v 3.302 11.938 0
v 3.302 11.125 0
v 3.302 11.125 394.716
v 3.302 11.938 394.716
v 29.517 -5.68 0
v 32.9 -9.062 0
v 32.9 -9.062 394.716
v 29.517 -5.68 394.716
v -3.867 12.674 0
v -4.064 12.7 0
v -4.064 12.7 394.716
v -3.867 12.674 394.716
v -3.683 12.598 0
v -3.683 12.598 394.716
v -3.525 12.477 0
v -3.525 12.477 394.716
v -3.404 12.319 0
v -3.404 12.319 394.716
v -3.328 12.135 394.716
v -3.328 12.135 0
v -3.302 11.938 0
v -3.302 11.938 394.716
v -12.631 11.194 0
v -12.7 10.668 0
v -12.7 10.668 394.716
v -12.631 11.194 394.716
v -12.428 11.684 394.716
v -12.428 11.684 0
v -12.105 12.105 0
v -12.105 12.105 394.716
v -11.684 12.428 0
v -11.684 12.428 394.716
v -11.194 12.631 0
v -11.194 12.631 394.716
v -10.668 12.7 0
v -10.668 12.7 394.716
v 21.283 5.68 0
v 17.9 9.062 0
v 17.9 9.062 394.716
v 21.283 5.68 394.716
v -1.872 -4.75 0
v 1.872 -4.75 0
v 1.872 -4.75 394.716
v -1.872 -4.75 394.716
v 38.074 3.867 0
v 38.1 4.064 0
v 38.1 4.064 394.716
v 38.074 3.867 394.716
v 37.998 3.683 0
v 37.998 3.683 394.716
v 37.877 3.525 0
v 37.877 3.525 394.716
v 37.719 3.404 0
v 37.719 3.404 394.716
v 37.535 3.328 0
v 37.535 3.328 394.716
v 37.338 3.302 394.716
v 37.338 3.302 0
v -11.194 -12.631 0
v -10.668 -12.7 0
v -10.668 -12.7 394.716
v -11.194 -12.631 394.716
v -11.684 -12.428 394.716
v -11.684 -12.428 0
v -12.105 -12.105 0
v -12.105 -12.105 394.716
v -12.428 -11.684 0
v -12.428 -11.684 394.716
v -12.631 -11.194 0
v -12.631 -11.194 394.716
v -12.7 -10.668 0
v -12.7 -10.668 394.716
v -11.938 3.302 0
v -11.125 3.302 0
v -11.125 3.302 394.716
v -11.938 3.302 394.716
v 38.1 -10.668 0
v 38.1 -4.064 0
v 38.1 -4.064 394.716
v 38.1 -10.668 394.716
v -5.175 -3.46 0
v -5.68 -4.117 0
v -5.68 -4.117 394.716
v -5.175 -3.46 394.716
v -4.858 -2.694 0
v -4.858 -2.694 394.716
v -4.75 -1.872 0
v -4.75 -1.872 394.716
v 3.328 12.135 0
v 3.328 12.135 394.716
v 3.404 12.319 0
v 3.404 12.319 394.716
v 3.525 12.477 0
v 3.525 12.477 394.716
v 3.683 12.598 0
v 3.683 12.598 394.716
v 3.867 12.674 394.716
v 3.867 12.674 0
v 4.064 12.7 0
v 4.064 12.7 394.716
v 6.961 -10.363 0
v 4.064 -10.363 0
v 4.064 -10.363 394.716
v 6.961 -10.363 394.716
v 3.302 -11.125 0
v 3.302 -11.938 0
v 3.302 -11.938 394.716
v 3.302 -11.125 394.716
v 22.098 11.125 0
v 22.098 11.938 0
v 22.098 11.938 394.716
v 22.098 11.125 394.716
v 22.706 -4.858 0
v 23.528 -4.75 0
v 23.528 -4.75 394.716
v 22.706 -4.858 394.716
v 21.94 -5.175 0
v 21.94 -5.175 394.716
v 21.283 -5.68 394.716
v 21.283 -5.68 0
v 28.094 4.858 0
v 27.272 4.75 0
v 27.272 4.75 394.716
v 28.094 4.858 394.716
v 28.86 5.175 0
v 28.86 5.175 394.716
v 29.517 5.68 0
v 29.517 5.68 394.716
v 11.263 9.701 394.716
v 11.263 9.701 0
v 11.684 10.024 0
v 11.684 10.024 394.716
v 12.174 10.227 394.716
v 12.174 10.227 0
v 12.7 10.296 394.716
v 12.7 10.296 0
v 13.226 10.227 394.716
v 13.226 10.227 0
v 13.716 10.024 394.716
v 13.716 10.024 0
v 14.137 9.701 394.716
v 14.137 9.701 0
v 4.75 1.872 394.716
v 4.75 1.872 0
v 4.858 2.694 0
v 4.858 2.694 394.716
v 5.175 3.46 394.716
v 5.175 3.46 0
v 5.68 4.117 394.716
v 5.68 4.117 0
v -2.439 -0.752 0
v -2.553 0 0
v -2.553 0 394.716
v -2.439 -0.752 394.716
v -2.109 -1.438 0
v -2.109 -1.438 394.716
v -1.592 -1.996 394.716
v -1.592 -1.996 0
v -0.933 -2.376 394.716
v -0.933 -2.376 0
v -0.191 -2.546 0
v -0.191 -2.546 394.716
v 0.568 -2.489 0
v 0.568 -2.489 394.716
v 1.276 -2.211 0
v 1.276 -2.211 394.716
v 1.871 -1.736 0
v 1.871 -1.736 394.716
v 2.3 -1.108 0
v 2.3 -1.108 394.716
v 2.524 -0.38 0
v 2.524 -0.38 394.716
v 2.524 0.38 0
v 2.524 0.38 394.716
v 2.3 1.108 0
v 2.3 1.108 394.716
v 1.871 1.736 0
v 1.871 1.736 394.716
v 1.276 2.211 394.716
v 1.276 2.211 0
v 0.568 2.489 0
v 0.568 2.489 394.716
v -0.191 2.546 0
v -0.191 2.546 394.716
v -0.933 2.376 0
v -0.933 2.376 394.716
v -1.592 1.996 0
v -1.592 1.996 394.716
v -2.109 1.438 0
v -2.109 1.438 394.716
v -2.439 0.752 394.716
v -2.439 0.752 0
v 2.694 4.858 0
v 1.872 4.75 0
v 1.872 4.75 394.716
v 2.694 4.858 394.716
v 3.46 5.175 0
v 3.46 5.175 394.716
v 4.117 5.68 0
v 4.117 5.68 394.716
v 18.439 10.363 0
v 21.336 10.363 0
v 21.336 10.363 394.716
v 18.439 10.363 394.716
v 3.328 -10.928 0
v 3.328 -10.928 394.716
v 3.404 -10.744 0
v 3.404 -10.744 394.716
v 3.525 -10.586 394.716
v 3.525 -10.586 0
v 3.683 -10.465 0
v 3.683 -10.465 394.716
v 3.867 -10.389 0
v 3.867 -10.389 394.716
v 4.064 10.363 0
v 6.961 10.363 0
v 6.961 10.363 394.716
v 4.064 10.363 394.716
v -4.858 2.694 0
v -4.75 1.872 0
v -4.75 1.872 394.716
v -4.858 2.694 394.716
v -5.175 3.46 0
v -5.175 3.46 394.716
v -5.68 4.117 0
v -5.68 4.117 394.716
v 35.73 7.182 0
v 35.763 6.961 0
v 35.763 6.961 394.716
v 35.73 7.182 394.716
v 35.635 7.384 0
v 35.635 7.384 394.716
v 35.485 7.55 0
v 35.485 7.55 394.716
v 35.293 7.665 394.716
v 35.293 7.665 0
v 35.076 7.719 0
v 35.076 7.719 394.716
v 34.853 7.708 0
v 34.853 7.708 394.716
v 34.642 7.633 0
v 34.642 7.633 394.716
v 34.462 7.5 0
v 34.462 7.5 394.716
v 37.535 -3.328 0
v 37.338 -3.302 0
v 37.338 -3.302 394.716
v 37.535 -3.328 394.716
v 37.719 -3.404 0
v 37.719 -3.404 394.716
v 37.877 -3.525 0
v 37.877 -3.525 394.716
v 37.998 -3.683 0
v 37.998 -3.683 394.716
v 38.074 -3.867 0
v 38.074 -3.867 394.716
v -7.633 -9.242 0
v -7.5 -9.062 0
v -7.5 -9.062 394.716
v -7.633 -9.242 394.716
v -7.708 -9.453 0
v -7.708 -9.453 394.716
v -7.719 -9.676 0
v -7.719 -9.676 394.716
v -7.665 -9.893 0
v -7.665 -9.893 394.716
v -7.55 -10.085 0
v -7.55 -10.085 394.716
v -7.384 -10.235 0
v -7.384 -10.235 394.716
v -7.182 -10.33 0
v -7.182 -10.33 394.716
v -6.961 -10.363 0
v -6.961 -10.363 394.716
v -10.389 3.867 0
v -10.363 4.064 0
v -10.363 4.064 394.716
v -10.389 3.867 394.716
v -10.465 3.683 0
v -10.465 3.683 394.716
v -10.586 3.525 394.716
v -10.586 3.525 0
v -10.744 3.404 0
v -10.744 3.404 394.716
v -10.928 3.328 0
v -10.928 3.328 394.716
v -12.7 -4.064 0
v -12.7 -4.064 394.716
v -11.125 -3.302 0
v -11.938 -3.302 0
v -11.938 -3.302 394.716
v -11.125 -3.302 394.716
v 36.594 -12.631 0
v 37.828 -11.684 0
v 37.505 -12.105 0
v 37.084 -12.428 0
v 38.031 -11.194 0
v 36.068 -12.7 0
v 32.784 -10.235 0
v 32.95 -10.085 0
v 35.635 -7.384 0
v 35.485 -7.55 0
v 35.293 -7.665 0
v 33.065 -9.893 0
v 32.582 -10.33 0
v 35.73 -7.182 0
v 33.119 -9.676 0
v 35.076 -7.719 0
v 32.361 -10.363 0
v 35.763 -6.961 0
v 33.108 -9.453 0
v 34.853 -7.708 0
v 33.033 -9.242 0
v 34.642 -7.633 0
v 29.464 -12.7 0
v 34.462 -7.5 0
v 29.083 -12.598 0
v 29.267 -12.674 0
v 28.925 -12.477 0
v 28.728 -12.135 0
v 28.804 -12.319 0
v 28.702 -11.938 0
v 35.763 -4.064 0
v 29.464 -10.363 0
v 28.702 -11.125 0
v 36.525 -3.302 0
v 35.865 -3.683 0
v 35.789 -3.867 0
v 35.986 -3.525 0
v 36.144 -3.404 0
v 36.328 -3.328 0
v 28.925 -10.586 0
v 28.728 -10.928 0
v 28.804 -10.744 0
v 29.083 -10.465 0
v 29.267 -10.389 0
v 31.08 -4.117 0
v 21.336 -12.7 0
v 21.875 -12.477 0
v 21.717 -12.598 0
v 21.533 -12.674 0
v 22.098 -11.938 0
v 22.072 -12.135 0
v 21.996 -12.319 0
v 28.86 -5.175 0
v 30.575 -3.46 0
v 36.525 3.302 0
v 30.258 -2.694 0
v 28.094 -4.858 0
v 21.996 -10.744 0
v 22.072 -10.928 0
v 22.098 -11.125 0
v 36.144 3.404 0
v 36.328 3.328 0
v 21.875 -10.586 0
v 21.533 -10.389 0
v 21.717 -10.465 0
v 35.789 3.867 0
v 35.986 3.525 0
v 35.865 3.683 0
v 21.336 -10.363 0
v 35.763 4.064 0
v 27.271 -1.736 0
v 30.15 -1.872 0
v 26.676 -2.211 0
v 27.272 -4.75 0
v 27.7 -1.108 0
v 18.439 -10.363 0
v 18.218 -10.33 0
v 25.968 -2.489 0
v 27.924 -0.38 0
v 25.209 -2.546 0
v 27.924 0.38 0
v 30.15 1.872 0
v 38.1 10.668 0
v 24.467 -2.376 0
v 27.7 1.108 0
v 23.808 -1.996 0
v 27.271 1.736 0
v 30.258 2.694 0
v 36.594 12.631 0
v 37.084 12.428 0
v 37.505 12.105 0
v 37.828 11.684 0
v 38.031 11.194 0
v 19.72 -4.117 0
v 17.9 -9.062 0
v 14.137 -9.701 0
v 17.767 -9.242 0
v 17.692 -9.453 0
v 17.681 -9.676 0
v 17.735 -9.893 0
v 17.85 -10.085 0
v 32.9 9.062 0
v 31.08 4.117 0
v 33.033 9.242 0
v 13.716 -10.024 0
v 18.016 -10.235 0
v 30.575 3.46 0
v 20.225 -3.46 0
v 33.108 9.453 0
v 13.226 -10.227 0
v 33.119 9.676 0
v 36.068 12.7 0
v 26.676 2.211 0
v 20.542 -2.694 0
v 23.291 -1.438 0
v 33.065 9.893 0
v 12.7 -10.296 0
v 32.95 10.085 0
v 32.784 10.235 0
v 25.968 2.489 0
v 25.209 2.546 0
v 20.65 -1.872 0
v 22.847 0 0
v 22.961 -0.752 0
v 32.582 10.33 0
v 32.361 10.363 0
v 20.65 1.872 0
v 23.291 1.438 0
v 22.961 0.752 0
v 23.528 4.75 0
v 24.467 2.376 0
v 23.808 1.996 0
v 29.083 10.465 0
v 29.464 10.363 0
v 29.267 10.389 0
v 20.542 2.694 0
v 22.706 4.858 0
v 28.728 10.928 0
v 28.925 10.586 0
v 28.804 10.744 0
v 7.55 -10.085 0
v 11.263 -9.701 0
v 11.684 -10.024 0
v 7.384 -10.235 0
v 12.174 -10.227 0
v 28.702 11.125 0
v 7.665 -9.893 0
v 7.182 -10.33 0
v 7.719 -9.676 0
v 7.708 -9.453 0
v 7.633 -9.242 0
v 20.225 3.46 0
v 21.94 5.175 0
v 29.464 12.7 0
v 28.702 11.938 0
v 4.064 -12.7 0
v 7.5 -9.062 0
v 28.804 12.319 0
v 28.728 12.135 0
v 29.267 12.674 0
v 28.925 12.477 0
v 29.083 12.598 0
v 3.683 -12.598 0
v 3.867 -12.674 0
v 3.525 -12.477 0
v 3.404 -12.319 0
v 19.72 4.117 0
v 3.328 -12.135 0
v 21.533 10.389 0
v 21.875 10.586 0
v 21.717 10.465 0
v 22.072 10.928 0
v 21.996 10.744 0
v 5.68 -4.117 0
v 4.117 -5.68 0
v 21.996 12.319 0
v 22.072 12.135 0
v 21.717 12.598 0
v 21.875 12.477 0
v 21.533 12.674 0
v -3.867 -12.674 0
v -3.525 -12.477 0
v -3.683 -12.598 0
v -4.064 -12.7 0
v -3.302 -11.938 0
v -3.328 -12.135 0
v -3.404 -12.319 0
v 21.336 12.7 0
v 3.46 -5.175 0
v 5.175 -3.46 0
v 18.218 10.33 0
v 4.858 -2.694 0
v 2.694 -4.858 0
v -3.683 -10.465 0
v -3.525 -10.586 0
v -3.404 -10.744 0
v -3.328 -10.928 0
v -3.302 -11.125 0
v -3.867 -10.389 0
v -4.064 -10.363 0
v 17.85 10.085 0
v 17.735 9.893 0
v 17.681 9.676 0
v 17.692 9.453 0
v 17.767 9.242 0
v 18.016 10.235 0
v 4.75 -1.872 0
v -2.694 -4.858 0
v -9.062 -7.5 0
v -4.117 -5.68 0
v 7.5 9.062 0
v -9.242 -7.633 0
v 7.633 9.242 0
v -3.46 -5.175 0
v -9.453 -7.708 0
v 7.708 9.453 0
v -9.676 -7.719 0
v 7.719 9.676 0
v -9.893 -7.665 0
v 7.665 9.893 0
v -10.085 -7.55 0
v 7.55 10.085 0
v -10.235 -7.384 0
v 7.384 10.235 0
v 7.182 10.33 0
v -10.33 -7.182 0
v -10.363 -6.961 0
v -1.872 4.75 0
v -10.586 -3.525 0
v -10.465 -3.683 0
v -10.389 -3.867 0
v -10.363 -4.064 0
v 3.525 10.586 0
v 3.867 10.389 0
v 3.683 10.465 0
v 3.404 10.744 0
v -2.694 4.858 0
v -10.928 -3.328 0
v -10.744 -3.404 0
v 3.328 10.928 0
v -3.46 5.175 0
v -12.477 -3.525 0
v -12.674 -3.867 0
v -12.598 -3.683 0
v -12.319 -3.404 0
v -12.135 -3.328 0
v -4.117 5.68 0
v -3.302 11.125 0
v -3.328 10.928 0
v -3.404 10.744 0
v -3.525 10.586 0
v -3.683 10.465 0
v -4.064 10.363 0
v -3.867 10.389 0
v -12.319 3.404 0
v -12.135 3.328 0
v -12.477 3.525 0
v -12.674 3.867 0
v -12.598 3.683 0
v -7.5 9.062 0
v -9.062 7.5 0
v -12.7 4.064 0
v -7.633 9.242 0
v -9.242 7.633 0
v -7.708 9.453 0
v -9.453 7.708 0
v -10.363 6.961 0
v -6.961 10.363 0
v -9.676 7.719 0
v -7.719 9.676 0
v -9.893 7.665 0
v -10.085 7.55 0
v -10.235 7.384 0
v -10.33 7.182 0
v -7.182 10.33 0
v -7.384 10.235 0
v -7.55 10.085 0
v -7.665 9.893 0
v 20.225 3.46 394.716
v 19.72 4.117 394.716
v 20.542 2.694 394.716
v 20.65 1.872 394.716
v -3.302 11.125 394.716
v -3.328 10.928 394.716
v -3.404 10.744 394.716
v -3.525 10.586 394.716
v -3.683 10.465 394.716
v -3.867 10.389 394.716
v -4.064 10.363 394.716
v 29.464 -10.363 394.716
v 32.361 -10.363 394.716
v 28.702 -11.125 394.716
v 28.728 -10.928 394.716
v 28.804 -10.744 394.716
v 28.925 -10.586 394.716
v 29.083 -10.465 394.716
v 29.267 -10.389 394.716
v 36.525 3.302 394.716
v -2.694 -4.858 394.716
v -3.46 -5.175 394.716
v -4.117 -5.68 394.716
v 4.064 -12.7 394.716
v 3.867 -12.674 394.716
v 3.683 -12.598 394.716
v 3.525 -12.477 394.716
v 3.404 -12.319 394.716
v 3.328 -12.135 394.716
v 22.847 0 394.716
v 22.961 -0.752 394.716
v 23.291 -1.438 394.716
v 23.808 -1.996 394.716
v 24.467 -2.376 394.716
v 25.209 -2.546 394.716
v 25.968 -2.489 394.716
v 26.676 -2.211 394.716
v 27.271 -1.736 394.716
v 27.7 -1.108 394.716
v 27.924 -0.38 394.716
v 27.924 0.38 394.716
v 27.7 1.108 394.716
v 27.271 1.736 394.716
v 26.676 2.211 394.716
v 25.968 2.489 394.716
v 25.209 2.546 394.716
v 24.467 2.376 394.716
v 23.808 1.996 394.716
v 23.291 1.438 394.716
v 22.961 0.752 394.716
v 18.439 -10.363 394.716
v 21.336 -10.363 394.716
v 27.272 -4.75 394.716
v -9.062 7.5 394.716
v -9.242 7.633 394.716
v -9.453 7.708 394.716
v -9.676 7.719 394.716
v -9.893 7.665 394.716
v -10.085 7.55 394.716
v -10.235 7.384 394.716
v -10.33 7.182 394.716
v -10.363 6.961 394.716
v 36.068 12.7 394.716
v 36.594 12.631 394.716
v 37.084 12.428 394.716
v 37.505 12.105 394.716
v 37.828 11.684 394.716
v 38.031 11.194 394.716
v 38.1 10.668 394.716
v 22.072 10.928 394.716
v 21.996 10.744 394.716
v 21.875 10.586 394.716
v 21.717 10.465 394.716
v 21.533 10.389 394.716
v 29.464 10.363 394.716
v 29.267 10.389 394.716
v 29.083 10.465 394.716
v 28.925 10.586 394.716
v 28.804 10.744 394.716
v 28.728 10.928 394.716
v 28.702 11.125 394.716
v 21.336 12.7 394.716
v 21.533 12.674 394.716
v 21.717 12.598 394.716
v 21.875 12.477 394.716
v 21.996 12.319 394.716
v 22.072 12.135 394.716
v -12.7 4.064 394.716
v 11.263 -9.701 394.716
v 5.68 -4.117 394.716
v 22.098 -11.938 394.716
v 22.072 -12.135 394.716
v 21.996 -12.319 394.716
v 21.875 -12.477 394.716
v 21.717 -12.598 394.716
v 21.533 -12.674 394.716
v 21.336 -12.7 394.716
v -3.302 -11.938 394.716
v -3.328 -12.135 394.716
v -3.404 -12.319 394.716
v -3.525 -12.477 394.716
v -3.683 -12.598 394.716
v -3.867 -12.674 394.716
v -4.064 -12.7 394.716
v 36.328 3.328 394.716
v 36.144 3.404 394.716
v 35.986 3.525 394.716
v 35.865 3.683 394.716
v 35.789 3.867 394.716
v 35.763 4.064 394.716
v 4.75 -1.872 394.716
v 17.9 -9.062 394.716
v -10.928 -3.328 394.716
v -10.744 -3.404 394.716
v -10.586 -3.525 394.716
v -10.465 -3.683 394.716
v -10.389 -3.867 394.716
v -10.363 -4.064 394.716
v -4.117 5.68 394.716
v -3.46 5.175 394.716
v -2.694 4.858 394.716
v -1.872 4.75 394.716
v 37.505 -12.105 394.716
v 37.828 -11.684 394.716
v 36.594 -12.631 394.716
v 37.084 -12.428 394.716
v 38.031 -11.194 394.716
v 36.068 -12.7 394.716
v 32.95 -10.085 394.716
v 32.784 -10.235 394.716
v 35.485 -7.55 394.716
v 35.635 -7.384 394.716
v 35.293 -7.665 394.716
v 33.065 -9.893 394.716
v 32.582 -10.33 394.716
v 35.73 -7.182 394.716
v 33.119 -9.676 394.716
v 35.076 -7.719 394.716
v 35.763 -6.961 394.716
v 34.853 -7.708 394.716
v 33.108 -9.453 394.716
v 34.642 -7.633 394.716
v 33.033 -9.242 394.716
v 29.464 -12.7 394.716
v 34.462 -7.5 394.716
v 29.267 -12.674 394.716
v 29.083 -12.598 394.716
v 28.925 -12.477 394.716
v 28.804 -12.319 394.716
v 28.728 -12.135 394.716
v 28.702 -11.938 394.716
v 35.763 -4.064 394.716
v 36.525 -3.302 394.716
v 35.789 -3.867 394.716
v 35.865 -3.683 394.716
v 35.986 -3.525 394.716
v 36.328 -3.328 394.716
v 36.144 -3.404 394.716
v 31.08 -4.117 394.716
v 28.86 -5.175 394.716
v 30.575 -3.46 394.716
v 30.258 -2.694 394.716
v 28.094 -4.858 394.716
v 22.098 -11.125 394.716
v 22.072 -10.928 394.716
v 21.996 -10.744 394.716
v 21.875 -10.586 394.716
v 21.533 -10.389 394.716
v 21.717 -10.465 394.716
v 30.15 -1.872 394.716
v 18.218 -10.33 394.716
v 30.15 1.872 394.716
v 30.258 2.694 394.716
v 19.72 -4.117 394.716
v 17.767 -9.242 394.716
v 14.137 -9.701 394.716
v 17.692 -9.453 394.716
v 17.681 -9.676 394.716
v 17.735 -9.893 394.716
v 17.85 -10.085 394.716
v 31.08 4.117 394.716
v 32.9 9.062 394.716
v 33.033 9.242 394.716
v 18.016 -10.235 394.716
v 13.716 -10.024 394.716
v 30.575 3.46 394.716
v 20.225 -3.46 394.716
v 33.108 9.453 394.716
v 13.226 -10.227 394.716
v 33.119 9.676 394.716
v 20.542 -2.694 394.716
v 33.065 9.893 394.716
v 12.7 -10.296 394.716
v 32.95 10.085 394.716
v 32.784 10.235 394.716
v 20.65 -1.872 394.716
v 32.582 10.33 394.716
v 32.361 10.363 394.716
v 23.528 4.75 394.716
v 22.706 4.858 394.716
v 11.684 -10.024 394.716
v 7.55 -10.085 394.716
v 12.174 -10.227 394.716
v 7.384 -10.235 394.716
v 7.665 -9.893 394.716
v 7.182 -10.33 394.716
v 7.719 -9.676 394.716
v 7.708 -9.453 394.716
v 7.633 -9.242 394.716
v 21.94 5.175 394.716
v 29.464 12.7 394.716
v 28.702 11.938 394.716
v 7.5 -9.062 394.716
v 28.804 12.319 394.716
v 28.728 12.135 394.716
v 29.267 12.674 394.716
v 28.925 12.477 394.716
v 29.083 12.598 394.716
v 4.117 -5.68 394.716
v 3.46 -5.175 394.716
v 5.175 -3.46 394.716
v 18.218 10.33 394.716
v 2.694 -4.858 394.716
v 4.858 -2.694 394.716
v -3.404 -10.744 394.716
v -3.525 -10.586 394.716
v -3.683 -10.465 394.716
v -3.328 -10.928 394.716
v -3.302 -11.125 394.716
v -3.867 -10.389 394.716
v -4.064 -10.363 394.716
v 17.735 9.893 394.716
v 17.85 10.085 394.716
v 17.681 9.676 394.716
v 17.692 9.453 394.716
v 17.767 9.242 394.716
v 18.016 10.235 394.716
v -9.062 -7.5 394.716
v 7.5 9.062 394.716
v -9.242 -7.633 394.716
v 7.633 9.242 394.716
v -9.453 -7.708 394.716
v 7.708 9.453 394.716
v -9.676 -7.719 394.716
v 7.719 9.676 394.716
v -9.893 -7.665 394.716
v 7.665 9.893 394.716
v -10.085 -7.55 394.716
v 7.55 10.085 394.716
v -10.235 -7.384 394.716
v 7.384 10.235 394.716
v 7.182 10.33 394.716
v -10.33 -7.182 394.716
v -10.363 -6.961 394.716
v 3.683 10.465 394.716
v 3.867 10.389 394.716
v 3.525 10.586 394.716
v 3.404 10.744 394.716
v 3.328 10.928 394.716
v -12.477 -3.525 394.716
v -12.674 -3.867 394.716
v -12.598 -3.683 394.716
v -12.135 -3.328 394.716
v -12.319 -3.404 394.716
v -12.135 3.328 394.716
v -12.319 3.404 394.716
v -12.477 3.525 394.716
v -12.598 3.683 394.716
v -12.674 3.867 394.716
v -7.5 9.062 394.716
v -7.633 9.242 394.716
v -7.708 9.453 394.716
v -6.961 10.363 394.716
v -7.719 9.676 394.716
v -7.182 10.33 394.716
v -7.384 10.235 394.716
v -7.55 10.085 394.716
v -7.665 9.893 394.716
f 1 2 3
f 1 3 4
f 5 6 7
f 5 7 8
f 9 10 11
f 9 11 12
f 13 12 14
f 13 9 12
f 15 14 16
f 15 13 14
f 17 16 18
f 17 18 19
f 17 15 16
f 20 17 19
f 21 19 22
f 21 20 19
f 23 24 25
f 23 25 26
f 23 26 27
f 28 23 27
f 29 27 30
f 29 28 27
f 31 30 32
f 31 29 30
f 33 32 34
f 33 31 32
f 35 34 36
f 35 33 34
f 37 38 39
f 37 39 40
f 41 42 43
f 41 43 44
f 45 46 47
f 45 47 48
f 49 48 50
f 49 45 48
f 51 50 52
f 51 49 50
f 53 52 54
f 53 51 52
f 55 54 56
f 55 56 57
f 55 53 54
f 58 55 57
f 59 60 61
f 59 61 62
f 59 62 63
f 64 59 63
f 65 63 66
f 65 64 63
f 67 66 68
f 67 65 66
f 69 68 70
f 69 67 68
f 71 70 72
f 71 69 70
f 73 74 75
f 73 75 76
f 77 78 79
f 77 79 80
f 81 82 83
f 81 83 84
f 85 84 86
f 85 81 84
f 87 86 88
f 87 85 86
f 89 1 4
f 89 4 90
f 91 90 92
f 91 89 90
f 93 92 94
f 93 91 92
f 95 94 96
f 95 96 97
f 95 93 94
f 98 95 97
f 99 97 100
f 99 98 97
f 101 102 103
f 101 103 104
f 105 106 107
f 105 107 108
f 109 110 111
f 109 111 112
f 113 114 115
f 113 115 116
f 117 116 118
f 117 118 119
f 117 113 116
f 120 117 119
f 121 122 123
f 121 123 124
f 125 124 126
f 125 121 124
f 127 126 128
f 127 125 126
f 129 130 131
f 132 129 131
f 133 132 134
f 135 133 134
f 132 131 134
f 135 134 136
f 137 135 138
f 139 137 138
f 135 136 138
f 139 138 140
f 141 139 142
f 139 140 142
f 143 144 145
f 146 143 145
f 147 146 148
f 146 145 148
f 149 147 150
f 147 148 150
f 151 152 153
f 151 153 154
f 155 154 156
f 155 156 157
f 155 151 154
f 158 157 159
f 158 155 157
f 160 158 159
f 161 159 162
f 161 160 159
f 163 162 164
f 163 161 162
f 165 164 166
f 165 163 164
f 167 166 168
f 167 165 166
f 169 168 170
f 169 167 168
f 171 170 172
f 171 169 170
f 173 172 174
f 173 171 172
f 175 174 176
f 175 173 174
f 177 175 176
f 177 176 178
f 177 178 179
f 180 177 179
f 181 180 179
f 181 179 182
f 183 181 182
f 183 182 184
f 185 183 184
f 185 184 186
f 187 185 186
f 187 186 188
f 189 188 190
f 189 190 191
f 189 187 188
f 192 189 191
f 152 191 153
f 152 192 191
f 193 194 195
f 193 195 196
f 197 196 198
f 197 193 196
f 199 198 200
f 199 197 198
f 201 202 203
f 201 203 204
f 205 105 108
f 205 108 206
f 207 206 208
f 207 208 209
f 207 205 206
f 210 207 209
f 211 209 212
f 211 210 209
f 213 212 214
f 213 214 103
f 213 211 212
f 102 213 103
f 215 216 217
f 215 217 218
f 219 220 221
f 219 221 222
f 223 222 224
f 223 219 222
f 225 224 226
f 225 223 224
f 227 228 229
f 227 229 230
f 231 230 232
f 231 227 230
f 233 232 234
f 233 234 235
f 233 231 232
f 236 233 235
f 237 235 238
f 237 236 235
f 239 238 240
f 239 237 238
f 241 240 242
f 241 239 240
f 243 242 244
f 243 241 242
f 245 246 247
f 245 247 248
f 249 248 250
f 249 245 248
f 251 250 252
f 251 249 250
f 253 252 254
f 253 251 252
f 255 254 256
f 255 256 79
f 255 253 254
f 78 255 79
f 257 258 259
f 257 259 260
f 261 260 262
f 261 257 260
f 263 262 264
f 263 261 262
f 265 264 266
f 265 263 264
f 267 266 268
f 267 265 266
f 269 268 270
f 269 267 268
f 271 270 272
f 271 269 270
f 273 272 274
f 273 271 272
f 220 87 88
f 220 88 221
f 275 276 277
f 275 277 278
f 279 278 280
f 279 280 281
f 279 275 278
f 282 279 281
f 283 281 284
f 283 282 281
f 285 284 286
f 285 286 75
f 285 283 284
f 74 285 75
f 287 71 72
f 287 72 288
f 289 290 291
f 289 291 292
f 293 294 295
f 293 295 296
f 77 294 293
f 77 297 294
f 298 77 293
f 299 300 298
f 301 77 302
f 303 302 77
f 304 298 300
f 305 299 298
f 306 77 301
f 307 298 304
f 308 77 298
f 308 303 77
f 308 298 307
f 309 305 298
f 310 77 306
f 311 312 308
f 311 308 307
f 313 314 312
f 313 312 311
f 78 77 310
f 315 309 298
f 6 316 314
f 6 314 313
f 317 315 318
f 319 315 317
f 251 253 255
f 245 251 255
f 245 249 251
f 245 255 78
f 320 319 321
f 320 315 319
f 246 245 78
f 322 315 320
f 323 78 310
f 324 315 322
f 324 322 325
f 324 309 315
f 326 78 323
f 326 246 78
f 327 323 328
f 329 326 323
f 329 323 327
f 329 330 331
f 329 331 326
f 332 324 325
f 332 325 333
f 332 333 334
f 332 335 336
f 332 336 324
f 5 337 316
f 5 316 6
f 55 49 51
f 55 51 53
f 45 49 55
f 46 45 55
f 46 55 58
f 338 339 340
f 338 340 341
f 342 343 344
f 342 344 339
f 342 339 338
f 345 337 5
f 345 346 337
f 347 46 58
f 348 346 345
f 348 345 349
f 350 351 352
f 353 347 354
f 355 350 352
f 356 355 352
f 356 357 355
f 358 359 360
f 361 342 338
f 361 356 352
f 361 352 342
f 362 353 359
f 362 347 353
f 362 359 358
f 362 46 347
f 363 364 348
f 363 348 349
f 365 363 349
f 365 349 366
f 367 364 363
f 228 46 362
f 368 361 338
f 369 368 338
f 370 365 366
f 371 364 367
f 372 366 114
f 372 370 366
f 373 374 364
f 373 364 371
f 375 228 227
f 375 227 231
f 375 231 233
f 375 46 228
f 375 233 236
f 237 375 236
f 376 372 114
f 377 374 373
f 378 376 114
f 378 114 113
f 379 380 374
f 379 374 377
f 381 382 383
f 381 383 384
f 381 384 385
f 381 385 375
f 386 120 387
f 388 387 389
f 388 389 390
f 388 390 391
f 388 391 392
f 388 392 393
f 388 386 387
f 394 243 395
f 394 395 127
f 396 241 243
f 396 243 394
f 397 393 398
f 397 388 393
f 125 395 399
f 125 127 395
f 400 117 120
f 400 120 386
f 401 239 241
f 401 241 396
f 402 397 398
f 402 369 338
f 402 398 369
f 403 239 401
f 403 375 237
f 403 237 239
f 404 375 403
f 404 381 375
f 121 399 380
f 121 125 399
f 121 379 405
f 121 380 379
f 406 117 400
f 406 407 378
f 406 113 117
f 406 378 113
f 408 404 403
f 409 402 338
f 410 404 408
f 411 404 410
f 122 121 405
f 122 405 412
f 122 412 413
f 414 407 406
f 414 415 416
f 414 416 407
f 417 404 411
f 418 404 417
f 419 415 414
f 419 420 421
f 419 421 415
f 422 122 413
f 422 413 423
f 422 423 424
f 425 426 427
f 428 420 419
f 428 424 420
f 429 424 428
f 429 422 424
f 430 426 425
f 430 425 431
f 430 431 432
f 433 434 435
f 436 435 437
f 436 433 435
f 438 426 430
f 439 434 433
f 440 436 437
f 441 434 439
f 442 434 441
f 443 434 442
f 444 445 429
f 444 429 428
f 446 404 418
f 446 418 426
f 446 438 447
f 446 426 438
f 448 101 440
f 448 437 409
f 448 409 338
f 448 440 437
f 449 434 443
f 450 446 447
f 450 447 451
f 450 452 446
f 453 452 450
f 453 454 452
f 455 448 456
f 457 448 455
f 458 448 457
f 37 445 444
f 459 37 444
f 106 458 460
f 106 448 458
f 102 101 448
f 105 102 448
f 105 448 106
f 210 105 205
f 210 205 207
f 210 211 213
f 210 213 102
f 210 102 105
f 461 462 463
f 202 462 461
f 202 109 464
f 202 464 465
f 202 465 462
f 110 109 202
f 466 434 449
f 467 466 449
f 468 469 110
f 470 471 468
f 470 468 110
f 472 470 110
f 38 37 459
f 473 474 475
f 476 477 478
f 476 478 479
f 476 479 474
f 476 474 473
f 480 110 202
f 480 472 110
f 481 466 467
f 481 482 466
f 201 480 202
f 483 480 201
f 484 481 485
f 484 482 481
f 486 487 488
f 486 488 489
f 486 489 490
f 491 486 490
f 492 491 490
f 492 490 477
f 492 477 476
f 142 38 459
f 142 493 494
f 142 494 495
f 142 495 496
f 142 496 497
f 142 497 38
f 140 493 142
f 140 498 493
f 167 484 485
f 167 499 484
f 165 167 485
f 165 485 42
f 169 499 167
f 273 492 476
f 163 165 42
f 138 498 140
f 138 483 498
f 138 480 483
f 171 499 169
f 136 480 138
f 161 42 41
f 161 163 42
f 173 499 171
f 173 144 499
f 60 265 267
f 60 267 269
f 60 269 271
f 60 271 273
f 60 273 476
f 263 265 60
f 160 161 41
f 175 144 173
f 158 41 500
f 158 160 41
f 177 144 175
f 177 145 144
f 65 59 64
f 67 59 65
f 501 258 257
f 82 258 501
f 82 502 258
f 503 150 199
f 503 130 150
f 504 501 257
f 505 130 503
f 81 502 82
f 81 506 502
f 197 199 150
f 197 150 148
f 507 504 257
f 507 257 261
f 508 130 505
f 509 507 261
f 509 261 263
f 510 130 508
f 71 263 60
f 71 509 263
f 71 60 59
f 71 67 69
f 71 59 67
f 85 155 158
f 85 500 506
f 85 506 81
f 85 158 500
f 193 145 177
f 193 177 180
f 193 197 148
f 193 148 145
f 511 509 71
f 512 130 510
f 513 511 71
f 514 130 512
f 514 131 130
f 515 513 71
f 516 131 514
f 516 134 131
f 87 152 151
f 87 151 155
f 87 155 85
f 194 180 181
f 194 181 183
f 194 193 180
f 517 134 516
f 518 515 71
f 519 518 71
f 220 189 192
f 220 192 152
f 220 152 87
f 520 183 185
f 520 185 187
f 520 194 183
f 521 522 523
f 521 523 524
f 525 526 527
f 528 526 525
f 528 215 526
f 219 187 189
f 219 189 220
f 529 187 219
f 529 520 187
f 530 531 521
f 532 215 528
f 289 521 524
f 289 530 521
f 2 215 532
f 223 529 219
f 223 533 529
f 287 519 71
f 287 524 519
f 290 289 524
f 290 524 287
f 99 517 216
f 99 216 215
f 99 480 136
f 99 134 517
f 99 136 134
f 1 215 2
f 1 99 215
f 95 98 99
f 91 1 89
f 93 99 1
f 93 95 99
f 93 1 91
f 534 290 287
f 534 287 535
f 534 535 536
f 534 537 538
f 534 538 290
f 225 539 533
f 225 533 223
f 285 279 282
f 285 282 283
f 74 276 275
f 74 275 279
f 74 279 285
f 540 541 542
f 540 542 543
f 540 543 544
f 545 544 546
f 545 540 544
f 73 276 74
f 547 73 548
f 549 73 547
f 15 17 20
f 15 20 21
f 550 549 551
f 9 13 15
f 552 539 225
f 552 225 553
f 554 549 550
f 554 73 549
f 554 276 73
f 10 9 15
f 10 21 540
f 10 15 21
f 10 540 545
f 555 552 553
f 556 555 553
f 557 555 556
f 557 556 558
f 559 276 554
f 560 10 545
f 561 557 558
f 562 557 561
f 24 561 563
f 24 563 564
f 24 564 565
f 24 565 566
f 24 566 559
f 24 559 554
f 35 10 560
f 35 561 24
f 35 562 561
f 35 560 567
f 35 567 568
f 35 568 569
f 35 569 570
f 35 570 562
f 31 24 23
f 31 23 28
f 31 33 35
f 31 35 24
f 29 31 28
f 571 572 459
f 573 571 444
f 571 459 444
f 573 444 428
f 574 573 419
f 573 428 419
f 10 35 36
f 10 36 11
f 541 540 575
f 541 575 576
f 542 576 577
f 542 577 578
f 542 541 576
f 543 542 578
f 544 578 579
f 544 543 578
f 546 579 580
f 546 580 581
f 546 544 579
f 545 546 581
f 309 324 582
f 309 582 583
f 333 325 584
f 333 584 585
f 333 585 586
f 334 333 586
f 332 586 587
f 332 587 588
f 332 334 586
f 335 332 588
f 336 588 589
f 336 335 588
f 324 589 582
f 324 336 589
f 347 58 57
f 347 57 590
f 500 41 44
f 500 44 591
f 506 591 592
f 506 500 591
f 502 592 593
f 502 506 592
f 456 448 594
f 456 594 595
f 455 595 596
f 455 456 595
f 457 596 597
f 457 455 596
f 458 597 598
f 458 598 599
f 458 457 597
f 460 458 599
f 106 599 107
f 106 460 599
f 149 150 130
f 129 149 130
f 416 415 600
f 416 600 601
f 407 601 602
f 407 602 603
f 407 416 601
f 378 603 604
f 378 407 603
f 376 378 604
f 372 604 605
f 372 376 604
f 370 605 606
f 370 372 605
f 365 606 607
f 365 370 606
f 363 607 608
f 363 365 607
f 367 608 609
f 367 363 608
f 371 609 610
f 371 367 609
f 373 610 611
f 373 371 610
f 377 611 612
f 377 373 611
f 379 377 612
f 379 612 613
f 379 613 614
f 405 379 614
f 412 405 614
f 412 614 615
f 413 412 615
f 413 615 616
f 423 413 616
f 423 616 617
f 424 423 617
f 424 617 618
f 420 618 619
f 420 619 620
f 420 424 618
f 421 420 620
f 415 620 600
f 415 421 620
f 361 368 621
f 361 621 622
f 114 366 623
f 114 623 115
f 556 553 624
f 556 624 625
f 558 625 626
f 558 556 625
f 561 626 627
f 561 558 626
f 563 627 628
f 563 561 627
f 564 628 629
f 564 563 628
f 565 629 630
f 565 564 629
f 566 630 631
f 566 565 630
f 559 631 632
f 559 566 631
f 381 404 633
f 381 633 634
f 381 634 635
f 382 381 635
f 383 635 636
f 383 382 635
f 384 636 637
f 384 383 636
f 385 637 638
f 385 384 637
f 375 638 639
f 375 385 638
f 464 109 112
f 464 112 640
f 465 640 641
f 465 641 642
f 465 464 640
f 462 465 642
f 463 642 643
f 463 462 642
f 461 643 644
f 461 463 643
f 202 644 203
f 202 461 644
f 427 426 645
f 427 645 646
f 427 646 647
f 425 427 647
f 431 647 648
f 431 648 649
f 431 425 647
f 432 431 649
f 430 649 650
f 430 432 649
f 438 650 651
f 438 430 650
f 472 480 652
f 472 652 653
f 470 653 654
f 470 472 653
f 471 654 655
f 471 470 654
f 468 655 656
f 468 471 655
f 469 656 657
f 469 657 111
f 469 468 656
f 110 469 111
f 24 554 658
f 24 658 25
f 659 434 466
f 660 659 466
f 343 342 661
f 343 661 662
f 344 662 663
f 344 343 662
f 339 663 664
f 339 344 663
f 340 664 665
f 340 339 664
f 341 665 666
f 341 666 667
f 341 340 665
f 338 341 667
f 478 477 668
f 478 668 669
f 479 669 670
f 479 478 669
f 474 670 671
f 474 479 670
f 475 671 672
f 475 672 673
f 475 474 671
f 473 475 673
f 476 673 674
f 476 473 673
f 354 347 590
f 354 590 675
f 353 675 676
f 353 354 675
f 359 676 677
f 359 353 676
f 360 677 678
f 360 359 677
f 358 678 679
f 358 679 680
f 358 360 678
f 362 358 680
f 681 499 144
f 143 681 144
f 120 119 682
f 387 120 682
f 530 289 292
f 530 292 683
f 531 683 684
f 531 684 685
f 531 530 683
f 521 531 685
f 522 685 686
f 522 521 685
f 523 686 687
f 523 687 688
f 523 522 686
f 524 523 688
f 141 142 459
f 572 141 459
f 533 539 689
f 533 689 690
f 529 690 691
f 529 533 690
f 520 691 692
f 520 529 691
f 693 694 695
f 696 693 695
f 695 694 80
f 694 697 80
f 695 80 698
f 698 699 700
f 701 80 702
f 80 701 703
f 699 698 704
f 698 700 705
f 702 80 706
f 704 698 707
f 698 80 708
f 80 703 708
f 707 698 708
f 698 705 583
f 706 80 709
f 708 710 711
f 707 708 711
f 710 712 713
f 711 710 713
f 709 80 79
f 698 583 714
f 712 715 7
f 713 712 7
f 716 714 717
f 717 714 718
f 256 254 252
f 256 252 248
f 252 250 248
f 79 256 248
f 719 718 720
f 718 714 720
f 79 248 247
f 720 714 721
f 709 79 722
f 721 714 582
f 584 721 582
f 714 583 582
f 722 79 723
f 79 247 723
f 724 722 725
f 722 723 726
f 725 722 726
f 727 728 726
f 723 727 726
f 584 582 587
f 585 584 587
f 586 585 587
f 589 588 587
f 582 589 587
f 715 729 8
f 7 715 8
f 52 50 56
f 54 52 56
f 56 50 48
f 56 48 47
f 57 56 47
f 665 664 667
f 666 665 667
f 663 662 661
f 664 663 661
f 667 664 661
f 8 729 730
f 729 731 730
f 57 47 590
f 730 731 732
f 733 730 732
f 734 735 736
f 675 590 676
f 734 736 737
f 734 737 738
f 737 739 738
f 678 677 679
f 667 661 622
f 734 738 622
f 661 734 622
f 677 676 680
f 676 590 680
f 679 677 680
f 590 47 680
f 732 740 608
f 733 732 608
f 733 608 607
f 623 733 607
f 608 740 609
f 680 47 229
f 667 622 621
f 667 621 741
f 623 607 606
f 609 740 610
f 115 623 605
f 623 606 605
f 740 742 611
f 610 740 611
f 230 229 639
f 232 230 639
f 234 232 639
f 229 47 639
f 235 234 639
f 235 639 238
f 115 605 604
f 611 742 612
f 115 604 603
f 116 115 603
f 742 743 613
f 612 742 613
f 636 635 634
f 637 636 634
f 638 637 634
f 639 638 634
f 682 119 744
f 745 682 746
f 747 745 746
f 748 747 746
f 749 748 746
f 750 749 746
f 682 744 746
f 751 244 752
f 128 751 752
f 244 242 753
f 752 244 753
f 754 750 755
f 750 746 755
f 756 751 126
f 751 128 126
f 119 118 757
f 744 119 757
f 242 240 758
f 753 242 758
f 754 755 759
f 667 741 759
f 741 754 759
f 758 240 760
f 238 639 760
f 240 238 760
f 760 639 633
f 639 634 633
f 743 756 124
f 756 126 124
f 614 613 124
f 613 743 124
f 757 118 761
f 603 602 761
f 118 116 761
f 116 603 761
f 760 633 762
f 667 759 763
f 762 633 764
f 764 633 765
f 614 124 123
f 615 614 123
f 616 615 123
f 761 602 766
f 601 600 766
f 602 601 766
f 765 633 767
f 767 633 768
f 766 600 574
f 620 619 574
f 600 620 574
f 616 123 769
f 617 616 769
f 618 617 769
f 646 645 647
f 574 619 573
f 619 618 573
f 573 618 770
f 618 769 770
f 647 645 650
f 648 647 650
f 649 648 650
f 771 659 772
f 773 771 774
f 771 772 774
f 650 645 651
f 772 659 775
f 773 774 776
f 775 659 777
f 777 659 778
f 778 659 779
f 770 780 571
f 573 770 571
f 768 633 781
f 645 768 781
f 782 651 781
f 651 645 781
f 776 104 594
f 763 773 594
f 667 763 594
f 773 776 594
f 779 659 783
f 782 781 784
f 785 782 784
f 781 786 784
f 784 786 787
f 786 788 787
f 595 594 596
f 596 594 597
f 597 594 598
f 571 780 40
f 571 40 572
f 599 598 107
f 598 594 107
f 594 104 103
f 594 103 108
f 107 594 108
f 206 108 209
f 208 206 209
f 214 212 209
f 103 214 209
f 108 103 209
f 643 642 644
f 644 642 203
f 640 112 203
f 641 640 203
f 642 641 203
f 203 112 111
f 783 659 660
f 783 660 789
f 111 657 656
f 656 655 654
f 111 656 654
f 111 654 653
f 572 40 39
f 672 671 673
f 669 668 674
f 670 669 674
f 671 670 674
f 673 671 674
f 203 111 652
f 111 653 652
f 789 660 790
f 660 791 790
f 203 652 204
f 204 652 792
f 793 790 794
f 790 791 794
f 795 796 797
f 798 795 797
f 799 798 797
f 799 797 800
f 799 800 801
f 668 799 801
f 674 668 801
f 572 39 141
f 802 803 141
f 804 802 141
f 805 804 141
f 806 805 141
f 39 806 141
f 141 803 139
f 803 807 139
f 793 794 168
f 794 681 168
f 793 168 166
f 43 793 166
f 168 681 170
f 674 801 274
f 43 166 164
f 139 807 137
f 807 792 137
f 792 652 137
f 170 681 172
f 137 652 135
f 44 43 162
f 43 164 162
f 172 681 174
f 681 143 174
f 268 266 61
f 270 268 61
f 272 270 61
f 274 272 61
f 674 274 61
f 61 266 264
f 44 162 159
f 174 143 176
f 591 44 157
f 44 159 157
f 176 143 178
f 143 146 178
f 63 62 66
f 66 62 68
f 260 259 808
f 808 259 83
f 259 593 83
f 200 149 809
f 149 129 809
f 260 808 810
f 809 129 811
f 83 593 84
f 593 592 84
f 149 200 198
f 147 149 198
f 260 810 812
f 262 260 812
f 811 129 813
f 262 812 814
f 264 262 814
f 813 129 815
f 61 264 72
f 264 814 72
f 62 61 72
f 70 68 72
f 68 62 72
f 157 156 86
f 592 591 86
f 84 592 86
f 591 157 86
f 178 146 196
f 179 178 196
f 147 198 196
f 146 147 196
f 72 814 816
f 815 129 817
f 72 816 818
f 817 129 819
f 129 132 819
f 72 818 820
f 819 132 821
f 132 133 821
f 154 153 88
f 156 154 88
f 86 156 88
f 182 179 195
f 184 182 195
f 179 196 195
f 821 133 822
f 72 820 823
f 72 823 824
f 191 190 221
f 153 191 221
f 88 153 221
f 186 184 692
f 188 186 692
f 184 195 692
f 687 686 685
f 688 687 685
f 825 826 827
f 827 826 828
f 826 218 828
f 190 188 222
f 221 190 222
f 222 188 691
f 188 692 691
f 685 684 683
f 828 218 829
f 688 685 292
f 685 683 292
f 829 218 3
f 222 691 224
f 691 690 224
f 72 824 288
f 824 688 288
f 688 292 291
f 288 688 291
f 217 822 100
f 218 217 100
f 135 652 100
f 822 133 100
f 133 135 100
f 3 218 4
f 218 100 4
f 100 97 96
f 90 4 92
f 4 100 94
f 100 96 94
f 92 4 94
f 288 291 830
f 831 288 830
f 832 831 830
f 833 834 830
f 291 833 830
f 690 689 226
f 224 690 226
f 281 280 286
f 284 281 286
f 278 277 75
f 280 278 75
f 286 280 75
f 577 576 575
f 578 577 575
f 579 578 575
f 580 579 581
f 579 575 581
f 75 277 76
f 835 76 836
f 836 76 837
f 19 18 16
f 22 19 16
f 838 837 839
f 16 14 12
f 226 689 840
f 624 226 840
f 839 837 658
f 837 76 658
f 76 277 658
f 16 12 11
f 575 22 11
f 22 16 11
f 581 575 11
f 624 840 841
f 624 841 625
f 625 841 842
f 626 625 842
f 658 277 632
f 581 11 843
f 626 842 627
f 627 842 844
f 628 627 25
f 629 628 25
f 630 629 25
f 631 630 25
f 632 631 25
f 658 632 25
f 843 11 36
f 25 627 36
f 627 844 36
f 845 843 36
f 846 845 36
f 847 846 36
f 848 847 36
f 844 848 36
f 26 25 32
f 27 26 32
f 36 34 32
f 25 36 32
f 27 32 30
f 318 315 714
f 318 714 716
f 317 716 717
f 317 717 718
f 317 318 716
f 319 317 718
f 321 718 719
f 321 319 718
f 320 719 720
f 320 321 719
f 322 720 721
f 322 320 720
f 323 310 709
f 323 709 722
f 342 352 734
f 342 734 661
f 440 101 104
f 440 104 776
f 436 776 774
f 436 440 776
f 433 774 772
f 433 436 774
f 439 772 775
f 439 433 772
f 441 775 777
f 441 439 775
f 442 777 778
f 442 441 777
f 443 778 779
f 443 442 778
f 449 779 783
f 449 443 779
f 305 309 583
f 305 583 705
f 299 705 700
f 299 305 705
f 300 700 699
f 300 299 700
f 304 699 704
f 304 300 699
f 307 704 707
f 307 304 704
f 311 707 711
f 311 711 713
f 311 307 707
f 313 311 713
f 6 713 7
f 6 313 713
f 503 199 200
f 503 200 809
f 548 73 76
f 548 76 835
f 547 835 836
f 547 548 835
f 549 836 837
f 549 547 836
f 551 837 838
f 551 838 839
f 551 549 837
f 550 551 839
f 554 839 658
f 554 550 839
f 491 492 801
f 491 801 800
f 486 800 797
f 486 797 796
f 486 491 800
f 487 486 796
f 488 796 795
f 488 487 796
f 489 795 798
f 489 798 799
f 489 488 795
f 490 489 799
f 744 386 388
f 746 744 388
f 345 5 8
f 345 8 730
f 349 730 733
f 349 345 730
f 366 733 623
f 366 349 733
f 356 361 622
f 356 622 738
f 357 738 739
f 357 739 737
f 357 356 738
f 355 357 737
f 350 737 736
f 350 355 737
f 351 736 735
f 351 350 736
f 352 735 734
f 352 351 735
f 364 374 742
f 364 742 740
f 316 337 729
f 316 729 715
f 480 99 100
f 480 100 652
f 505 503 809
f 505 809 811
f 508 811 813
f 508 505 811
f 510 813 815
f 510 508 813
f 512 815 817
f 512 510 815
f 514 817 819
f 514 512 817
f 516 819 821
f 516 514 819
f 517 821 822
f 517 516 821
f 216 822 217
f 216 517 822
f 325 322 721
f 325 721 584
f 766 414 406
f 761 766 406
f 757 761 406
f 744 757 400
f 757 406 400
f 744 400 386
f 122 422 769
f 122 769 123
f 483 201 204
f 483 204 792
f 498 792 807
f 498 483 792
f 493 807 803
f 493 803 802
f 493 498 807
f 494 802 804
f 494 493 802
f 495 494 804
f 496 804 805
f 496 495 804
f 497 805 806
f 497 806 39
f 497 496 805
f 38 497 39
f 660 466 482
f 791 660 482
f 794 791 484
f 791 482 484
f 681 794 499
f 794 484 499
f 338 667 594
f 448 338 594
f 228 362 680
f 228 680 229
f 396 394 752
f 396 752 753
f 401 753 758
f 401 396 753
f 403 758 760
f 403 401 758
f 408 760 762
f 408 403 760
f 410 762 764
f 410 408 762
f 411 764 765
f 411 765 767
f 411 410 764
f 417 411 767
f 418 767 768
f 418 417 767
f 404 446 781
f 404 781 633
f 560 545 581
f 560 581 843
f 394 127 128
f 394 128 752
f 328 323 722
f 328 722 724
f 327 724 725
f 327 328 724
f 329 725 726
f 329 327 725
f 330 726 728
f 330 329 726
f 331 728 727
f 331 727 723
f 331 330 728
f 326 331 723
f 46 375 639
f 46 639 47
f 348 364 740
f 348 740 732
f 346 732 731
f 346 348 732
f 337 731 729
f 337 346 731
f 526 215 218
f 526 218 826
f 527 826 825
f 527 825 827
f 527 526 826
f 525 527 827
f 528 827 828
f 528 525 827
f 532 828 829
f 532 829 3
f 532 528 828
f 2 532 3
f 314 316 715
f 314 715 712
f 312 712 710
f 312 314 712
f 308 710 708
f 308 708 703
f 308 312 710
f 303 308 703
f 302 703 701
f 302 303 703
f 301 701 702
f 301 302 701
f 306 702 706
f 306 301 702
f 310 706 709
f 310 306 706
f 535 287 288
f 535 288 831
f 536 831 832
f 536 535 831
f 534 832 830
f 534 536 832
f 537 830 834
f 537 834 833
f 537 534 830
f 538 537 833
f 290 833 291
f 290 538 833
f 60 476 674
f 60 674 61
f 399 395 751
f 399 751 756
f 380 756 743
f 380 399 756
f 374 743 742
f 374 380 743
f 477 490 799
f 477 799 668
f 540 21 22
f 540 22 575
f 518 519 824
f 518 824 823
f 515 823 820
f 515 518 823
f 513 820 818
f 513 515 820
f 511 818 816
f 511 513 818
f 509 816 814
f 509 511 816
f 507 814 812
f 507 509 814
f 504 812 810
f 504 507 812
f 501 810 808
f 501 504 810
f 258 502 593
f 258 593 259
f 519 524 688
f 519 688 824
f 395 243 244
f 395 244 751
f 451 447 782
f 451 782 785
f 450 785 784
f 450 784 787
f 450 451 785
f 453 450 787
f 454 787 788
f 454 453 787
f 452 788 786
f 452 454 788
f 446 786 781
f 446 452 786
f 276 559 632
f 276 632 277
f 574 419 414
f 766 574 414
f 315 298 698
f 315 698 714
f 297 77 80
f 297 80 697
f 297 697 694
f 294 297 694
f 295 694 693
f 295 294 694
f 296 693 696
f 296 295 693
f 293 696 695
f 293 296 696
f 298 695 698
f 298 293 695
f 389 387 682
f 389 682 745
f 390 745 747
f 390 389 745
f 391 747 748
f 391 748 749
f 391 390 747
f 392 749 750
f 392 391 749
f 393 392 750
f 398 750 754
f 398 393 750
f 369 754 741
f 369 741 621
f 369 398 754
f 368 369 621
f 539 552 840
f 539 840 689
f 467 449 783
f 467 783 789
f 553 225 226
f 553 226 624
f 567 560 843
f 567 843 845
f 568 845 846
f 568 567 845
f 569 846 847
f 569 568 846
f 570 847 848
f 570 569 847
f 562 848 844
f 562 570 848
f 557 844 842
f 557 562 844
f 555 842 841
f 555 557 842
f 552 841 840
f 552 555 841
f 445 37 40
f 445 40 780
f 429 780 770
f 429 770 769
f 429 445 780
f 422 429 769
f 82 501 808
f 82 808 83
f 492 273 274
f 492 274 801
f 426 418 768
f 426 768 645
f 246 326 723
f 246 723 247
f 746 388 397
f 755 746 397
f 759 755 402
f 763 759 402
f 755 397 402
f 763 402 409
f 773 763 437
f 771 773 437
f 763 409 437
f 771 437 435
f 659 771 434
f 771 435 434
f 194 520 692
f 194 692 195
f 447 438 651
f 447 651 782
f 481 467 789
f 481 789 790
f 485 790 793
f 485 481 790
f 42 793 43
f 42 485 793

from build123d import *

# Parameters (mm, degrees)
SKETCH1_R           = 2.5527
BOSS_EXTRUDE1_DEPTH = 394.716


with BuildPart() as part:
    # Sketch1 → Boss-Extrude1 (new body)
    with BuildSketch(Plane.XY):
        with BuildLine():
            Line((-7.499820068, 9.062384633), (-4.117171405, 5.67973597))
            ThreePointArc((-4.117171405, 5.67973597), (-3.087127272, 4.991482484), (-1.872107374, 4.7498))
            Line((-1.872107374, 4.7498), (1.872107374, 4.7498))
            ThreePointArc((1.872107374, 4.7498), (3.087127272, 4.991482484), (4.117171405, 5.67973597))
            Line((4.117171405, 5.67973597), (7.499820068, 9.062384633))
            ThreePointArc((7.499820068, 9.062384633), (7.665000904, 9.892804775), (6.9610047, 10.3632))
            Line((6.9610047, 10.3632), (4.064, 10.3632))
            ThreePointArc((4.064, 10.3632), (3.525184633, 10.586384633), (3.302, 11.1252))
            Line((3.302, 11.1252), (3.302, 11.938))
            ThreePointArc((3.302, 11.938), (3.525184633, 12.476815367), (4.064, 12.7))
            Line((4.064, 12.7), (10.668, 12.7))
            Line((10.668, 12.7), (14.732, 12.7))
            Line((14.732, 12.7), (21.336, 12.7))
            ThreePointArc((21.336, 12.7), (21.874815367, 12.476815367), (22.098, 11.938))
            Line((22.098, 11.938), (22.098, 11.1252))
            ThreePointArc((22.098, 11.1252), (21.874815367, 10.586384633), (21.336, 10.3632))
            Line((21.336, 10.3632), (18.4389953, 10.3632))
            ThreePointArc((18.4389953, 10.3632), (17.734999096, 9.892804775), (17.900179932, 9.062384633))
            Line((17.900179932, 9.062384633), (21.282828595, 5.67973597))
            ThreePointArc((21.282828595, 5.67973597), (22.312872728, 4.991482484), (23.527892626, 4.7498))
            Line((23.527892626, 4.7498), (27.272107374, 4.7498))
            ThreePointArc((27.272107374, 4.7498), (28.487127272, 4.991482484), (29.517171405, 5.67973597))
            Line((29.517171405, 5.67973597), (32.899820068, 9.062384633))
            ThreePointArc((32.899820068, 9.062384633), (33.065000904, 9.892804775), (32.3610047, 10.3632))
            Line((32.3610047, 10.3632), (29.464, 10.3632))
            ThreePointArc((29.464, 10.3632), (28.925184633, 10.586384633), (28.702, 11.1252))
            Line((28.702, 11.1252), (28.702, 11.938))
            ThreePointArc((28.702, 11.938), (28.925184633, 12.476815367), (29.464, 12.7))
            Line((29.464, 12.7), (36.068, 12.7))
            ThreePointArc((36.068, 12.7), (37.504840979, 12.104840979), (38.1, 10.668))
            Line((38.1, 10.668), (38.1, 4.064))
            ThreePointArc((38.1, 4.064), (37.876815367, 3.525184633), (37.338, 3.302))
            Line((37.338, 3.302), (36.5252, 3.302))
            ThreePointArc((36.5252, 3.302), (35.986384633, 3.525184633), (35.7632, 4.064))
            Line((35.7632, 4.064), (35.7632, 6.9610047))
            ThreePointArc((35.7632, 6.9610047), (35.292804775, 7.665000904), (34.462384633, 7.499820068))
            Line((34.462384633, 7.499820068), (31.07973597, 4.117171405))
            ThreePointArc((31.07973597, 4.117171405), (30.391482484, 3.087127272), (30.1498, 1.872107374))
            Line((30.1498, 1.872107374), (30.1498, -1.872107374))
            ThreePointArc((30.1498, -1.872107374), (30.391482484, -3.087127272), (31.07973597, -4.117171405))
            Line((31.07973597, -4.117171405), (34.462384633, -7.499820068))
            ThreePointArc((34.462384633, -7.499820068), (35.292804775, -7.665000904), (35.7632, -6.9610047))
            Line((35.7632, -6.9610047), (35.7632, -4.064))
            ThreePointArc((35.7632, -4.064), (35.986384633, -3.525184633), (36.5252, -3.302))
            Line((36.5252, -3.302), (37.338, -3.302))
            ThreePointArc((37.338, -3.302), (37.876815367, -3.525184633), (38.1, -4.064))
            Line((38.1, -4.064), (38.1, -10.668))
            ThreePointArc((38.1, -10.668), (37.504840979, -12.104840979), (36.068, -12.7))
            Line((36.068, -12.7), (29.464, -12.7))
            ThreePointArc((29.464, -12.7), (28.925184633, -12.476815367), (28.702, -11.938))
            Line((28.702, -11.938), (28.702, -11.1252))
            ThreePointArc((28.702, -11.1252), (28.925184633, -10.586384633), (29.464, -10.3632))
            Line((29.464, -10.3632), (32.3610047, -10.3632))
            ThreePointArc((32.3610047, -10.3632), (33.065000904, -9.892804775), (32.899820068, -9.062384633))
            Line((32.899820068, -9.062384633), (29.517171405, -5.67973597))
            ThreePointArc((29.517171405, -5.67973597), (28.487127272, -4.991482484), (27.272107374, -4.7498))
            Line((27.272107374, -4.7498), (23.527892626, -4.7498))
            ThreePointArc((23.527892626, -4.7498), (22.312872728, -4.991482484), (21.282828595, -5.67973597))
            Line((21.282828595, -5.67973597), (17.900179932, -9.062384633))
            ThreePointArc((17.900179932, -9.062384633), (17.734999096, -9.892804775), (18.4389953, -10.3632))
            Line((18.4389953, -10.3632), (21.336, -10.3632))
            ThreePointArc((21.336, -10.3632), (21.874815367, -10.586384633), (22.098, -11.1252))
            Line((22.098, -11.1252), (22.098, -11.938))
            ThreePointArc((22.098, -11.938), (21.874815367, -12.476815367), (21.336, -12.7))
            Line((21.336, -12.7), (14.732, -12.7))
            Line((14.732, -12.7), (10.668, -12.7))
            Line((10.668, -12.7), (4.064, -12.7))
            ThreePointArc((4.064, -12.7), (3.525184633, -12.476815367), (3.302, -11.938))
            Line((3.302, -11.938), (3.302, -11.1252))
            ThreePointArc((3.302, -11.1252), (3.525184633, -10.586384633), (4.064, -10.3632))
            Line((4.064, -10.3632), (6.9610047, -10.3632))
            ThreePointArc((6.9610047, -10.3632), (7.665000904, -9.892804775), (7.499820068, -9.062384633))
            Line((7.499820068, -9.062384633), (4.117171405, -5.67973597))
            ThreePointArc((4.117171405, -5.67973597), (3.087127272, -4.991482484), (1.872107374, -4.7498))
            Line((1.872107374, -4.7498), (-1.872107374, -4.7498))
            ThreePointArc((-1.872107374, -4.7498), (-3.087127272, -4.991482484), (-4.117171405, -5.67973597))
            Line((-4.117171405, -5.67973597), (-7.499820068, -9.062384633))
            ThreePointArc((-7.499820068, -9.062384633), (-7.665000904, -9.892804775), (-6.9610047, -10.3632))
            Line((-6.9610047, -10.3632), (-4.064, -10.3632))
            ThreePointArc((-4.064, -10.3632), (-3.525184633, -10.586384633), (-3.302, -11.1252))
            Line((-3.302, -11.1252), (-3.302, -11.938))
            ThreePointArc((-3.302, -11.938), (-3.525184633, -12.476815367), (-4.064, -12.7))
            Line((-4.064, -12.7), (-10.668, -12.7))
            ThreePointArc((-10.668, -12.7), (-12.104840979, -12.104840979), (-12.7, -10.668))
            Line((-12.7, -10.668), (-12.7, -4.064))
            ThreePointArc((-12.7, -4.064), (-12.476815367, -3.525184633), (-11.938, -3.302))
            Line((-11.938, -3.302), (-11.1252, -3.302))
            ThreePointArc((-11.1252, -3.302), (-10.586384633, -3.525184633), (-10.3632, -4.064))
            Line((-10.3632, -4.064), (-10.3632, -6.9610047))
            ThreePointArc((-10.3632, -6.9610047), (-9.892804775, -7.665000904), (-9.062384633, -7.499820068))
            Line((-9.062384633, -7.499820068), (-5.67973597, -4.117171405))
            ThreePointArc((-5.67973597, -4.117171405), (-4.991482484, -3.087127272), (-4.7498, -1.872107374))
            Line((-4.7498, -1.872107374), (-4.7498, 1.872107374))
            ThreePointArc((-4.7498, 1.872107374), (-4.991482484, 3.087127272), (-5.67973597, 4.117171405))
            Line((-5.67973597, 4.117171405), (-9.062384633, 7.499820068))
            ThreePointArc((-9.062384633, 7.499820068), (-9.892804775, 7.665000904), (-10.3632, 6.9610047))
            Line((-10.3632, 6.9610047), (-10.3632, 4.064))
            ThreePointArc((-10.3632, 4.064), (-10.586384633, 3.525184633), (-11.1252, 3.302))
            Line((-11.1252, 3.302), (-11.938, 3.302))
            ThreePointArc((-11.938, 3.302), (-12.476815367, 3.525184633), (-12.7, 4.064))
            Line((-12.7, 4.064), (-12.7, 10.668))
            ThreePointArc((-12.7, 10.668), (-12.104840979, 12.104840979), (-10.668, 12.7))
            Line((-10.668, 12.7), (-4.064, 12.7))
            ThreePointArc((-4.064, 12.7), (-3.525184633, 12.476815367), (-3.302, 11.938))
            Line((-3.302, 11.938), (-3.302, 11.1252))
            ThreePointArc((-3.302, 11.1252), (-3.525184633, 10.586384633), (-4.064, 10.3632))
            Line((-4.064, 10.3632), (-6.9610047, 10.3632))
            ThreePointArc((-6.9610047, 10.3632), (-7.665000904, 9.892804775), (-7.499820068, 9.062384633))
        make_face()
        with Locations(Location((0, 0, 0), (0, 0, 180))):
            Circle(SKETCH1_R, mode=Mode.SUBTRACT)
        with Locations(Location((25.4, 0, 0), (0, 0, 180))):
            Circle(SKETCH1_R, mode=Mode.SUBTRACT)
        with BuildLine():
            Line((4.7498, -1.872107374), (4.7498, 1.872107374))
            ThreePointArc((4.7498, 1.872107374), (4.991482484, 3.087127272), (5.67973597, 4.117171405))
            Line((5.67973597, 4.117171405), (11.263159021, 9.700594456))
            ThreePointArc((11.263159021, 9.700594456), (12.7, 10.295753476), (14.136840979, 9.700594456))
            Line((14.136840979, 9.700594456), (19.72026403, 4.117171405))
            ThreePointArc((19.72026403, 4.117171405), (20.408517516, 3.087127272), (20.6502, 1.872107374))
            Line((20.6502, 1.872107374), (20.6502, -1.872107374))
            ThreePointArc((20.6502, -1.872107374), (20.408517516, -3.087127272), (19.72026403, -4.117171405))
            Line((19.72026403, -4.117171405), (14.136840979, -9.700594456))
            ThreePointArc((14.136840979, -9.700594456), (12.7, -10.295753476), (11.263159021, -9.700594456))
            Line((11.263159021, -9.700594456), (5.67973597, -4.117171405))
            ThreePointArc((5.67973597, -4.117171405), (4.991482484, -3.087127272), (4.7498, -1.872107374))
        make_face(mode=Mode.SUBTRACT)
    extrude(amount=BOSS_EXTRUDE1_DEPTH)


solid = part.part
